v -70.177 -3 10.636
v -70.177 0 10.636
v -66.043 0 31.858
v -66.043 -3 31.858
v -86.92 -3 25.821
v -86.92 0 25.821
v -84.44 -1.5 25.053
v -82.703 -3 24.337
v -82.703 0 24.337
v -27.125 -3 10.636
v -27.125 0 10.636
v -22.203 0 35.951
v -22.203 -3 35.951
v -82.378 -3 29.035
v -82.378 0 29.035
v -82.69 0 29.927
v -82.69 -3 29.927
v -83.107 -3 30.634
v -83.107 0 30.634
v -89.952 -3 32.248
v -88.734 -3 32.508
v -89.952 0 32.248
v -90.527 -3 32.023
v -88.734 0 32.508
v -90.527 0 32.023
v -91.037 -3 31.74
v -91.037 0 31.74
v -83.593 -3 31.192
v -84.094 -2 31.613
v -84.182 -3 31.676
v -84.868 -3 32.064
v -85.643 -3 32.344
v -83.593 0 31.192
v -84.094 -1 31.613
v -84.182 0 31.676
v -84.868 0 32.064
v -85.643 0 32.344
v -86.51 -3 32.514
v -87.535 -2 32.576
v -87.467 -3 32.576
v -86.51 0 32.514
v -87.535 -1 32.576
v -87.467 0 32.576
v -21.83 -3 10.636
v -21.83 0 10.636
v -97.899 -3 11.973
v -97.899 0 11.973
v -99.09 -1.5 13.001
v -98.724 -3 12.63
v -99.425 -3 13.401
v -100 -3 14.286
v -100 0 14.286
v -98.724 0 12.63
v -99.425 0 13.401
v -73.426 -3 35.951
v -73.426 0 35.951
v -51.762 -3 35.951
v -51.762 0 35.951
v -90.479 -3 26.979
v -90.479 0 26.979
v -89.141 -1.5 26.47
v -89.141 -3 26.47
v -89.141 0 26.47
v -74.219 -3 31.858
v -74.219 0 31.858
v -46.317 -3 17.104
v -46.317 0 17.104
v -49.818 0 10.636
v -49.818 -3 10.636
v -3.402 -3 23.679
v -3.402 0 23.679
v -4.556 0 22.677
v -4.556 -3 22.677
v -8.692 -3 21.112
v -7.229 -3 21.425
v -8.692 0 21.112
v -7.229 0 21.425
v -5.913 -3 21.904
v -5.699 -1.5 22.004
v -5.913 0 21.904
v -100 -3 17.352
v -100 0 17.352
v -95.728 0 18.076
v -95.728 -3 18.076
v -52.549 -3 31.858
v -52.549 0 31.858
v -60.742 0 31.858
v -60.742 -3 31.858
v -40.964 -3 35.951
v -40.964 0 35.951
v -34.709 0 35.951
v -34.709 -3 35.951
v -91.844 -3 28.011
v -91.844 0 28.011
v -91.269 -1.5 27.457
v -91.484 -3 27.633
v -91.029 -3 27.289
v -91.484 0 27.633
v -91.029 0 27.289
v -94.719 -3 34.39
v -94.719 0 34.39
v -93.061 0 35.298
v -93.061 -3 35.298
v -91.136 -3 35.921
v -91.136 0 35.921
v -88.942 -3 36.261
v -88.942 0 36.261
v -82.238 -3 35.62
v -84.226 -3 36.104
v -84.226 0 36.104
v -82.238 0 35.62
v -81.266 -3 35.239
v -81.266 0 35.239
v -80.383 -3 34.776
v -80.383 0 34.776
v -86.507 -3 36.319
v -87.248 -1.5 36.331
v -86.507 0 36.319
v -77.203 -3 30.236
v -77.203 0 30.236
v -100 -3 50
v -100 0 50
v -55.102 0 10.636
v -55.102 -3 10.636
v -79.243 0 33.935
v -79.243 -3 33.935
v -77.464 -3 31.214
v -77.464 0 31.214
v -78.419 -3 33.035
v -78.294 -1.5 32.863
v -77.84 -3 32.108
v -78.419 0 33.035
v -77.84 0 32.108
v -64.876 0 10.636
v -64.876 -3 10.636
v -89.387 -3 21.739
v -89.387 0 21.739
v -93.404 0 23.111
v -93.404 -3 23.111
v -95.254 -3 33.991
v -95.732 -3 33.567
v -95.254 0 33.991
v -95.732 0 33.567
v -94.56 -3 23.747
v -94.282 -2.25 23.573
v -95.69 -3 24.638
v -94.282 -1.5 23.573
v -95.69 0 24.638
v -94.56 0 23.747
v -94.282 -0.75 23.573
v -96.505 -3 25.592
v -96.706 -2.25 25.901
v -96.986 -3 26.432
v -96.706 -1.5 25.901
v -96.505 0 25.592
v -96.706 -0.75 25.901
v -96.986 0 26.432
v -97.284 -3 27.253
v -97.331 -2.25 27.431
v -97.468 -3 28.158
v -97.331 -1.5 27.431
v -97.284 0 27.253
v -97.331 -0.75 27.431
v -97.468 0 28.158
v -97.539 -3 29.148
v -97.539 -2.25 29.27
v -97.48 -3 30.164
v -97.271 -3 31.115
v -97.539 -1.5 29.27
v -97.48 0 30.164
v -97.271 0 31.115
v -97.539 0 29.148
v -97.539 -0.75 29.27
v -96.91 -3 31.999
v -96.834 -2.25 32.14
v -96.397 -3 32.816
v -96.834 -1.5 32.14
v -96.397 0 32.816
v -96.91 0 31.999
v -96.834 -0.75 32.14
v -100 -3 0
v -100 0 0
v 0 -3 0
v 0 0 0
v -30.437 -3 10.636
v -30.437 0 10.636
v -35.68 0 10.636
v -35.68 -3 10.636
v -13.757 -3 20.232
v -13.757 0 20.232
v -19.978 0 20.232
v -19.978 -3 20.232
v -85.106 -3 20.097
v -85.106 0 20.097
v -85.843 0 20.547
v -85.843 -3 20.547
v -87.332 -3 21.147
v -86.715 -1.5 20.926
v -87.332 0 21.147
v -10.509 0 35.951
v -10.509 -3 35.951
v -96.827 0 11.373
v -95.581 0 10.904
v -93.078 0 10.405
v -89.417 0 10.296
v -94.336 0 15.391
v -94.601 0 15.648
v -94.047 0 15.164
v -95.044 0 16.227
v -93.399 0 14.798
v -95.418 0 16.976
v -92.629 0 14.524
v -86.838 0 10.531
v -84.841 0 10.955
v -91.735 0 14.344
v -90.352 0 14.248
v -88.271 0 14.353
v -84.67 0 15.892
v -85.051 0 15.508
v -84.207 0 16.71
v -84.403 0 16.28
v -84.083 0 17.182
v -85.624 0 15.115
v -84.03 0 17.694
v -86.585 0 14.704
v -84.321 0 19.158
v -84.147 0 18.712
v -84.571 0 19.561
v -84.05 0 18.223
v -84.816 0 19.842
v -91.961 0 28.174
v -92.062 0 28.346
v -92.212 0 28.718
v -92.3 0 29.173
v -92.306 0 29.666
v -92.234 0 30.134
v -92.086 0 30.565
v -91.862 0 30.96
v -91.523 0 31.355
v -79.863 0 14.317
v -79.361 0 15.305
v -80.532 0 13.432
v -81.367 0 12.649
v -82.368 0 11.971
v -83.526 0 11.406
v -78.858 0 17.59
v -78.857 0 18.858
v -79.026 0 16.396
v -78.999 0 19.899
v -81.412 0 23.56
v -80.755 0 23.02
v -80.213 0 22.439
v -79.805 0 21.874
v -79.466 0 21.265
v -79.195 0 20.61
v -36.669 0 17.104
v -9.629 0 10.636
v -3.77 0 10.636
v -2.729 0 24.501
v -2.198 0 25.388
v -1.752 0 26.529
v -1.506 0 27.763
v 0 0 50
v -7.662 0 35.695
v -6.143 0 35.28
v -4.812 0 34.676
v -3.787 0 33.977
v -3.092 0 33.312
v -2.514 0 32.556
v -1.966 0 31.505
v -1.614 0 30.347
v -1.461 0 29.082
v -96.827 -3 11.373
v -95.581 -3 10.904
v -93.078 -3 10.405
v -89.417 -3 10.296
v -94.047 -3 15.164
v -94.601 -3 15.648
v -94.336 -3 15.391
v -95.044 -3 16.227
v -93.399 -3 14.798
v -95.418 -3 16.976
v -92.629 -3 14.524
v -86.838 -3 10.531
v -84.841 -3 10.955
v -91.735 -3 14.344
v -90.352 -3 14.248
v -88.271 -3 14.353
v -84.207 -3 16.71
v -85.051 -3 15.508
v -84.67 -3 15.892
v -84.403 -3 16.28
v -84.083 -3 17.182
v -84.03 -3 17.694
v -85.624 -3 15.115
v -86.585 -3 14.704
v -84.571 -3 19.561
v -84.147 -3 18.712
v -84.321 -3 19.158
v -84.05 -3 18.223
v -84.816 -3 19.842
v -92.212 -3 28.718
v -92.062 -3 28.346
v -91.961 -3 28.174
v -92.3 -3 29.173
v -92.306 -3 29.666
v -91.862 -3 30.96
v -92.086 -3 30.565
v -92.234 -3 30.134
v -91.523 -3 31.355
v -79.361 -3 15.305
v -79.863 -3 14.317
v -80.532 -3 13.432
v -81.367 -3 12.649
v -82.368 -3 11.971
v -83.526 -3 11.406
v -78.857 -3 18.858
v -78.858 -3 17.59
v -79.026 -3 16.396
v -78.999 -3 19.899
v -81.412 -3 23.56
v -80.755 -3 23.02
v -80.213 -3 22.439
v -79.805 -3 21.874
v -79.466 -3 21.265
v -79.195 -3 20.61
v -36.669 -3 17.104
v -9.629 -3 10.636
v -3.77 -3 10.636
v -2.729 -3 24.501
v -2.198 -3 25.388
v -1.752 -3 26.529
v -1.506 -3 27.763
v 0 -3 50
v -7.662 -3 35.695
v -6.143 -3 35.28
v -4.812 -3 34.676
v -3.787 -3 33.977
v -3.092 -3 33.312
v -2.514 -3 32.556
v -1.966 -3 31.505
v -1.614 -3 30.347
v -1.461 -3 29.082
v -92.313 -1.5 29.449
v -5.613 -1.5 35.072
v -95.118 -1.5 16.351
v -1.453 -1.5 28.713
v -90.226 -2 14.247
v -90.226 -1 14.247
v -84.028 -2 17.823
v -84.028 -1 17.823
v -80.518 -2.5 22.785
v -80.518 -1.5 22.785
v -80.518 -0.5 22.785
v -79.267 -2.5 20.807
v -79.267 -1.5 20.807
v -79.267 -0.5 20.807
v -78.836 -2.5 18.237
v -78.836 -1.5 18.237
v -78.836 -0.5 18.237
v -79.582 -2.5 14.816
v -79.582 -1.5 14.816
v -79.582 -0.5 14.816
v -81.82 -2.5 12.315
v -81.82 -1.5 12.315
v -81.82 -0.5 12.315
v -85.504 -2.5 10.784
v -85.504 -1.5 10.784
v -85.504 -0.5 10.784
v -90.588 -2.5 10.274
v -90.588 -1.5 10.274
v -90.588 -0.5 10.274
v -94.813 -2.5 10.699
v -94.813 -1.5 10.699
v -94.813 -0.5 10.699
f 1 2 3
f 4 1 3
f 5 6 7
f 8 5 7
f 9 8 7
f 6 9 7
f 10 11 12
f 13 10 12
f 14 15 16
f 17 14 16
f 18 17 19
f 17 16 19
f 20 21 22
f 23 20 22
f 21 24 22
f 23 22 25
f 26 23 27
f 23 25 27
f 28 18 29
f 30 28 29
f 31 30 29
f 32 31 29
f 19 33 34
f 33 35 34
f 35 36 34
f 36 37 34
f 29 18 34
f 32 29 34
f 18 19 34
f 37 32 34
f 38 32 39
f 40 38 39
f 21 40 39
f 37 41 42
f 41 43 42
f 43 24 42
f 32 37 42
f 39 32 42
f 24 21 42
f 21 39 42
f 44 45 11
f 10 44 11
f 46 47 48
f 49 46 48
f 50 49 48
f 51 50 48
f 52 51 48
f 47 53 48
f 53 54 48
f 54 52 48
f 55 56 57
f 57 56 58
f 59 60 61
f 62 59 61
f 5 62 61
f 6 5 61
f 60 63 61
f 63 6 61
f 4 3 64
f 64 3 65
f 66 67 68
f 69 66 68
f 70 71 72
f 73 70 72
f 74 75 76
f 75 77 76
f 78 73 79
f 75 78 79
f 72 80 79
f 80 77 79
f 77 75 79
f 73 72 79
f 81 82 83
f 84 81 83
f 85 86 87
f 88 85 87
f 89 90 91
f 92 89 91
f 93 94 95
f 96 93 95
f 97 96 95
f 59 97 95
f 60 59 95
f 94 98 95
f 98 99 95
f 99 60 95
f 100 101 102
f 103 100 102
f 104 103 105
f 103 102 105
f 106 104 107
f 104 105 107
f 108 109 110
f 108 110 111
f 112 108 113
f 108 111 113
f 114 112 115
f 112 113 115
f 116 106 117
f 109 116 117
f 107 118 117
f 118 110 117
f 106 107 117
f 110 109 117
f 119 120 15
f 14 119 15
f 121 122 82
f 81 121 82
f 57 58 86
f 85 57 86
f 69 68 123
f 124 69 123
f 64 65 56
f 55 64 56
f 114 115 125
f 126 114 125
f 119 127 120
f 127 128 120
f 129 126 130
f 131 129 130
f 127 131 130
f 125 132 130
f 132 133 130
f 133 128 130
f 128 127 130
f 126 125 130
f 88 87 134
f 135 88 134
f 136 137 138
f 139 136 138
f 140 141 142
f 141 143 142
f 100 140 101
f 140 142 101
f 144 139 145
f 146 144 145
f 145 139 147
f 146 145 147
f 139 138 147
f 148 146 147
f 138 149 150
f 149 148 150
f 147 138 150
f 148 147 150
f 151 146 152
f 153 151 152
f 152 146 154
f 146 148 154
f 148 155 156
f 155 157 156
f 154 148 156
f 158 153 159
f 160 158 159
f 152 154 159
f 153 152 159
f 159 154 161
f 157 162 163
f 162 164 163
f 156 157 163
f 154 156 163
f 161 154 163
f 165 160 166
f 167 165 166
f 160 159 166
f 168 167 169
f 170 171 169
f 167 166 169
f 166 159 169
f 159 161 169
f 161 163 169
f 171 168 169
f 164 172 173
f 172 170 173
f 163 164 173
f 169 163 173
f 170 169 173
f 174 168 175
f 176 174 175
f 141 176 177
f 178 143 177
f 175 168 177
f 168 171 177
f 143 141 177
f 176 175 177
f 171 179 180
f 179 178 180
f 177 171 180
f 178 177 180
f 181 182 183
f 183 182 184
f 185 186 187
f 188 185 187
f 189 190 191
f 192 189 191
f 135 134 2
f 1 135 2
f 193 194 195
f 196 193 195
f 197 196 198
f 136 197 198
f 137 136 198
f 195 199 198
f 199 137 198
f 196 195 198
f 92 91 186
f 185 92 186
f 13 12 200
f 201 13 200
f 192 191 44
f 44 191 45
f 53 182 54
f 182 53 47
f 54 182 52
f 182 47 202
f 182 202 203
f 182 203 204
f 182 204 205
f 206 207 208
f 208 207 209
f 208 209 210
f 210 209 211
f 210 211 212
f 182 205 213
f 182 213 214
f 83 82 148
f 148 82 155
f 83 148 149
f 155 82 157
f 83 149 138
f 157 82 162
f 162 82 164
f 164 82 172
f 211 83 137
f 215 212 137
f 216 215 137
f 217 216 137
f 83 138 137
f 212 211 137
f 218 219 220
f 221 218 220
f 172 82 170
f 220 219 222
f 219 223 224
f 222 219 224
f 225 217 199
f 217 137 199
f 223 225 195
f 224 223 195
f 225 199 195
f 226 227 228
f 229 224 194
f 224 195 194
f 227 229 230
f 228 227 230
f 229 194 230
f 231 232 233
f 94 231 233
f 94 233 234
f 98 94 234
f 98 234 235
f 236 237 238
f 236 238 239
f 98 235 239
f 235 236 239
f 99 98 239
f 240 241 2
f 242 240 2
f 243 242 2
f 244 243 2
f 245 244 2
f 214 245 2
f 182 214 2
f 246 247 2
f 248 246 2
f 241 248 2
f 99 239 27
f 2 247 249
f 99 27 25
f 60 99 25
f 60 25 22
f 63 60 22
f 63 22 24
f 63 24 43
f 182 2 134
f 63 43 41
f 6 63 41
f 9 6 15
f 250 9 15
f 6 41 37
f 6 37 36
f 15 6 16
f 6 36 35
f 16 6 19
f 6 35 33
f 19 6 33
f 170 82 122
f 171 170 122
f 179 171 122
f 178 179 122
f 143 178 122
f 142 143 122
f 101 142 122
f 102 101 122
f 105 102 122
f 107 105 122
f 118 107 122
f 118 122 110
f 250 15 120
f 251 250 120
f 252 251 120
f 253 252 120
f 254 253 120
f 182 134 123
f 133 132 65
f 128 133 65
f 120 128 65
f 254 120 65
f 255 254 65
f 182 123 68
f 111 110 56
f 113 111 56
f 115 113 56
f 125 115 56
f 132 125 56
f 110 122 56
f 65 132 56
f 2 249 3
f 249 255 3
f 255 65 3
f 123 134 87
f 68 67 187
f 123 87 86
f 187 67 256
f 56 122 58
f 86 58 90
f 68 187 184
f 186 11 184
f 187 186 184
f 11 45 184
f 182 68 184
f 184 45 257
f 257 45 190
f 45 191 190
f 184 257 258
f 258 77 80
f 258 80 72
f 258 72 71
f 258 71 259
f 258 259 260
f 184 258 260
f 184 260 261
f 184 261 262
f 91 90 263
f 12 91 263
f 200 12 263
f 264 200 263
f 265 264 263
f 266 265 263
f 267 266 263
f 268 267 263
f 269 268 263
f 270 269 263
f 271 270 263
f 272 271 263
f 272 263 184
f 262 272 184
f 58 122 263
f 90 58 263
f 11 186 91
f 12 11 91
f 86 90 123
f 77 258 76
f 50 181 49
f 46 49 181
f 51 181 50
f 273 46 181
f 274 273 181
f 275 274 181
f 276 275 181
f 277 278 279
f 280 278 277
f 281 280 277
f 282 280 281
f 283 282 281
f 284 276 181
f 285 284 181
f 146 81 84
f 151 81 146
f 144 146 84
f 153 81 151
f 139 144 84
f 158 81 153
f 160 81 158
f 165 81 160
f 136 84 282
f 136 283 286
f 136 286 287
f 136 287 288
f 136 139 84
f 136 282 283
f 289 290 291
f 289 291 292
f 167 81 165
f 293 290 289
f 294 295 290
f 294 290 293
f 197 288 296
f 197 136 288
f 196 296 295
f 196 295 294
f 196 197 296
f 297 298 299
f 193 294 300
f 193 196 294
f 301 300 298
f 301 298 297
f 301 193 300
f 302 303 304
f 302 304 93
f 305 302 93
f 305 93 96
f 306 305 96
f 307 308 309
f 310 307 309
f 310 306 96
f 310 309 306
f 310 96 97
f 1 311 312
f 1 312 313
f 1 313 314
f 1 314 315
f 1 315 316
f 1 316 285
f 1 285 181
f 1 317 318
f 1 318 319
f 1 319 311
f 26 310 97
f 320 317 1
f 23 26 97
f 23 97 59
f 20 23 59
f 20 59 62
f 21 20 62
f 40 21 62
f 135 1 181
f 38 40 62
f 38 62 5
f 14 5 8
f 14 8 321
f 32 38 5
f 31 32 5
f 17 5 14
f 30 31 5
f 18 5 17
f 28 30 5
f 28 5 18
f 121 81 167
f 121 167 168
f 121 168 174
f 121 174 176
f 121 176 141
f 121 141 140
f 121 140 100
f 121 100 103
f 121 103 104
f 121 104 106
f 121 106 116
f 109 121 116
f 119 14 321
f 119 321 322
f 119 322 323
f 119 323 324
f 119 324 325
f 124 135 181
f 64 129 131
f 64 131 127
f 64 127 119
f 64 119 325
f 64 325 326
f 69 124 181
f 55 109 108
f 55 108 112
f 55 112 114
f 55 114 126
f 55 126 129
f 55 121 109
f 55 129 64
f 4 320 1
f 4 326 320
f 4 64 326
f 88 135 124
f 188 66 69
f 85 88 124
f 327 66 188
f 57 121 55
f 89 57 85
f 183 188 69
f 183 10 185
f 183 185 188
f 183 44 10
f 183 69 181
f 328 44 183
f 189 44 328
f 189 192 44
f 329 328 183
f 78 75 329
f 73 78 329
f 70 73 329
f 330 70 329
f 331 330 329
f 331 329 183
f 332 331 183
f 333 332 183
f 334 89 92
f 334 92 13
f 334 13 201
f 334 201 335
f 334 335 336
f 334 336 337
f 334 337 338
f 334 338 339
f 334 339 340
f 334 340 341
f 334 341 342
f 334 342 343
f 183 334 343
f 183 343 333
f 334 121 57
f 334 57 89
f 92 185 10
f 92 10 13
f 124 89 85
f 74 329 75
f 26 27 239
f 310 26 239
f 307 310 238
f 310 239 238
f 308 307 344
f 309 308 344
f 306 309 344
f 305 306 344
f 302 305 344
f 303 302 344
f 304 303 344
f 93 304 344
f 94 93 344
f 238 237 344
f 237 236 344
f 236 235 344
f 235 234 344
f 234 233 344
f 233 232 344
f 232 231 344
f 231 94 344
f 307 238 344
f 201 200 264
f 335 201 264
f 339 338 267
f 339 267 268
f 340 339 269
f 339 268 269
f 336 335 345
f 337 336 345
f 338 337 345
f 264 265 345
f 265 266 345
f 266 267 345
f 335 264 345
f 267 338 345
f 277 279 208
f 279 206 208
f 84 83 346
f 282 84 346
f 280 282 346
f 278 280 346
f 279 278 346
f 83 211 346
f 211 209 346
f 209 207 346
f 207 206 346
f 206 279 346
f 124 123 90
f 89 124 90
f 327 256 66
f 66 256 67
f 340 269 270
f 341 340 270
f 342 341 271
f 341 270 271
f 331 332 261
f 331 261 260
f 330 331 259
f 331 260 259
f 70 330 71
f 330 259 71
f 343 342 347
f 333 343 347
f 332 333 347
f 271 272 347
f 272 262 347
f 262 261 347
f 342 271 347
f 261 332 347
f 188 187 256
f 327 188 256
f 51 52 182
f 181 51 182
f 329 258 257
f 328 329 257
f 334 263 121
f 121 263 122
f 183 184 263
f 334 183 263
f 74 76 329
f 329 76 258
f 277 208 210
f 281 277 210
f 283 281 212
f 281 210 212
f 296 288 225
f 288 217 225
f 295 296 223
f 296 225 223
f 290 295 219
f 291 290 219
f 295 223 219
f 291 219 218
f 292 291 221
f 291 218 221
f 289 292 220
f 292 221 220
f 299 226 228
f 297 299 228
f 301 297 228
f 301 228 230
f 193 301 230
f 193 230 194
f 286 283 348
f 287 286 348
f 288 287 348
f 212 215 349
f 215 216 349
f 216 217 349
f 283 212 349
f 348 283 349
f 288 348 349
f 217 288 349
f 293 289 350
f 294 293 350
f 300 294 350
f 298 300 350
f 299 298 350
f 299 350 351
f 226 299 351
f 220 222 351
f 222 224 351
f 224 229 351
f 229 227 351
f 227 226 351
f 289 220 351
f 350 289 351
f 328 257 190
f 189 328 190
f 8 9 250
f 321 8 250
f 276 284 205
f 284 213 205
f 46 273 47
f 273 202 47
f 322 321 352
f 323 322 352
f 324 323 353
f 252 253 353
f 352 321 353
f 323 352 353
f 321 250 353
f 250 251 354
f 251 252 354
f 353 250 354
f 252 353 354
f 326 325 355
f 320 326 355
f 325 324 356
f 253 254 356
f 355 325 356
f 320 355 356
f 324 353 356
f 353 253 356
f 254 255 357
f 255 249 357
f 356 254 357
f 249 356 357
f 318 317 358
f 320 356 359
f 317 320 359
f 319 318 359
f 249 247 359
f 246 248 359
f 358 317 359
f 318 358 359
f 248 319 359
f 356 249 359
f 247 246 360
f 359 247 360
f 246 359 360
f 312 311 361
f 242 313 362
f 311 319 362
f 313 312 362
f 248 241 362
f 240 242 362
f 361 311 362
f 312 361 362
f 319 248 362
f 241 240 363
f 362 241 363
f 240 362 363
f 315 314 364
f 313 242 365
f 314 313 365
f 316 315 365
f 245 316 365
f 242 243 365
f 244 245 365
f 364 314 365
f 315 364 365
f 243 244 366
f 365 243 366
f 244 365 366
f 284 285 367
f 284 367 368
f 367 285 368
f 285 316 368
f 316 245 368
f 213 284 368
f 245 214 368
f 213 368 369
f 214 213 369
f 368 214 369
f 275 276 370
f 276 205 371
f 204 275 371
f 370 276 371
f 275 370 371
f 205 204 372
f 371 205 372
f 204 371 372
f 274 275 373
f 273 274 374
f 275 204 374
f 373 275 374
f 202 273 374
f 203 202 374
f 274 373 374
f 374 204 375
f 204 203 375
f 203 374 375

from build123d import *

# Parameters (mm, degrees)
F1_DEPTH = 3


with BuildPart() as f1:
    # F0 (on Front) → F1 (new body)
    with BuildSketch(Plane.XZ):
        with BuildLine():
            Line((-100, 0), (0, 0))
            Line((0, 0), (0, 50))
            Line((0, 50), (-100, 50))
            Line((-100, 50), (-100, 17.3523504695))
            Line((-100, 17.3523504695), (-95.7282808558, 18.0761301251))
            add(Edge.make_bspline(
                [(-95.7282808558, 18.0761301251), (-95.3488123547, 16.081045733), (-94.0465454532, 15.1639968553)],
                knots=[0, 0, 0, 1, 1, 1], degree=2))
            add(Edge.make_bspline(
                [(-94.0465454532, 15.1639968553), (-92.7442785517, 14.2469479777), (-90.2259875899, 14.2469479777)],
                knots=[0, 0, 0, 1, 1, 1], degree=2))
            add(Edge.make_bspline(
                [(-90.2259875899, 14.2469479777), (-84.0280020719, 14.2469479777), (-84.0280020719, 17.8231511244)],
                knots=[0, 0, 0, 1, 1, 1], degree=2))
            add(Edge.make_bspline(
                [(-84.0280020719, 17.8231511244), (-84.0280020719, 19.2605318104), (-85.1060375864, 20.0970873696)],
                knots=[0, 0, 0, 1, 1, 1], degree=2))
            add(Edge.make_bspline(
                [(-85.1060375864, 20.0970873696), (-86.1840731009, 20.9336429289), (-89.3865572693, 21.738576113)],
                knots=[0, 0, 0, 1, 1, 1], degree=2))
            add(Edge.make_bspline(
                [(-89.3865572693, 21.738576113), (-92.692532847, 22.6182530928), (-94.2822758857, 23.5726738683)],
                knots=[0, 0, 0, 1, 1, 1], degree=2))
            add(Edge.make_bspline(
                [(-94.2822758857, 23.5726738683), (-95.8720189244, 24.5270946438), (-96.7056997223, 25.9012305796)],
                knots=[0, 0, 0, 1, 1, 1], degree=2))
            add(Edge.make_bspline(
                [(-96.7056997223, 25.9012305796), (-97.5393805202, 27.2753665154), (-97.5393805202, 29.2704509076)],
                knots=[0, 0, 0, 1, 1, 1], degree=2))
            add(Edge.make_bspline(
                [(-97.5393805202, 29.2704509076), (-97.5393805202, 32.449936985), (-94.7192396143, 34.390400911)],
                knots=[0, 0, 0, 1, 1, 1], degree=2))
            add(Edge.make_bspline(
                [(-94.7192396143, 34.390400911), (-91.8990987084, 36.3308648371), (-87.2477348085, 36.3308648371)],
                knots=[0, 0, 0, 1, 1, 1], degree=2))
            add(Edge.make_bspline(
                [(-87.2477348085, 36.3308648371), (-82.9700898871, 36.3308648371), (-80.3828046523, 34.7756189349)],
                knots=[0, 0, 0, 1, 1, 1], degree=2))
            add(Edge.make_bspline(
                [(-80.3828046523, 34.7756189349), (-77.7955194175, 33.2203730326), (-77.2033185749, 30.2363707285)],
                knots=[0, 0, 0, 1, 1, 1], degree=2))
            Line((-77.2033185749, 30.2363707285), (-82.3778890444, 29.0347204751))
            add(Edge.make_bspline(
                [(-82.3778890444, 29.0347204751), (-82.7746061138, 30.6503363661), (-84.0941215835, 31.6133814257)],
                knots=[0, 0, 0, 1, 1, 1], degree=2))
            add(Edge.make_bspline(
                [(-84.0941215835, 31.6133814257), (-85.4136370532, 32.5764264853), (-87.5352109457, 32.5764264853)],
                knots=[0, 0, 0, 1, 1, 1], degree=2))
            add(Edge.make_bspline(
                [(-87.5352109457, 32.5764264853), (-89.7602762476, 32.5764264853), (-91.0366702968, 31.7398709261)],
                knots=[0, 0, 0, 1, 1, 1], degree=2))
            add(Edge.make_bspline(
                [(-91.0366702968, 31.7398709261), (-92.3130643459, 30.9033153668), (-92.3130643459, 29.4486861126)],
                knots=[0, 0, 0, 1, 1, 1], degree=2))
            add(Edge.make_bspline(
                [(-92.3130643459, 29.4486861126), (-92.3130643459, 28.6035062693), (-91.8444782423, 28.0113054266)],
                knots=[0, 0, 0, 1, 1, 1], degree=2))
            add(Edge.make_bspline(
                [(-91.8444782423, 28.0113054266), (-91.3758921387, 27.419104584), (-90.4789665906, 26.9792660941)],
                knots=[0, 0, 0, 1, 1, 1], degree=2))
            add(Edge.make_bspline(
                [(-90.4789665906, 26.9792660941), (-89.5820410426, 26.5394276042), (-86.9200120121, 25.8207372612)],
                knots=[0, 0, 0, 1, 1, 1], degree=2))
            add(Edge.make_bspline(
                [(-86.9200120121, 25.8207372612), (-84.0682487312, 25.0273031225), (-82.7027370795, 24.3373603933)],
                knots=[0, 0, 0, 1, 1, 1], degree=2))
            add(Edge.make_bspline(
                [(-82.7027370795, 24.3373603933), (-81.3372254278, 23.647417664), (-80.5179184368, 22.7849892524)],
                knots=[0, 0, 0, 1, 1, 1], degree=2))
            add(Edge.make_bspline(
                [(-80.5179184368, 22.7849892524), (-79.6986114458, 21.9225608408), (-79.26739724, 20.8071534285)],
                knots=[0, 0, 0, 1, 1, 1], degree=2))
            add(Edge.make_bspline(
                [(-79.26739724, 20.8071534285), (-78.8361830342, 19.6917460162), (-78.8361830342, 18.237116762)],
                knots=[0, 0, 0, 1, 1, 1], degree=2))
            add(Edge.make_bspline(
                [(-78.8361830342, 18.237116762), (-78.8361830342, 14.3561889098), (-81.8201853383, 12.3151083357)],
                knots=[0, 0, 0, 1, 1, 1], degree=2))
            add(Edge.make_bspline(
                [(-81.8201853383, 12.3151083357), (-84.8041876424, 10.2740277616), (-90.5882075228, 10.2740277616)],
                knots=[0, 0, 0, 1, 1, 1], degree=2))
            add(Edge.make_bspline(
                [(-90.5882075228, 10.2740277616), (-95.3833094912, 10.2740277616), (-97.8987256917, 11.9730117325)],
                knots=[0, 0, 0, 1, 1, 1], degree=2))
            add(Edge.make_bspline(
                [(-97.8987256917, 11.9730117325), (-99.2313673487, 12.8731159831), (-100, 14.2855889299)],
                knots=[0, 0, 0, 0.529789725, 0.529789725, 0.529789725], degree=2))
            Line((-100, 14.2855889299), (-100, 0))
        make_face()
        Polygon((-52.5493650489, 31.8577361423), (-60.742434959, 31.8577361423), (-64.8763418119, 10.6362476945), (-70.1774017818, 10.6362476945), (-66.0434949289, 31.8577361423), (-74.2193162708, 31.8577361423), (-73.4258821321, 35.951396336), (-51.761680433, 35.951396336), align=None, mode=Mode.SUBTRACT)
        Polygon((-30.4367005758, 10.6362476945), (-35.6802653183, 10.6362476945), (-36.6691832302, 17.1044607814), (-46.3168823945, 17.1044607814), (-49.8183417456, 10.6362476945), (-55.1021531472, 10.6362476945), (-40.9640767199, 35.951396336), (-34.7085959745, 35.951396336), align=None, mode=Mode.SUBTRACT)
        with BuildLine():
            Line((-3.7704140895, 10.6362476945), (-9.6291777655, 10.6362476945))
            Line((-9.6291777655, 10.6362476945), (-13.7573350957, 20.2322011541))
            Line((-13.7573350957, 20.2322011541), (-19.9783187046, 20.2322011541))
            Line((-19.9783187046, 20.2322011541), (-21.8296650281, 10.6362476945))
            Line((-21.8296650281, 10.6362476945), (-27.1249754753, 10.6362476945))
            Line((-27.1249754753, 10.6362476945), (-22.2033840065, 35.951396336))
            Line((-22.2033840065, 35.951396336), (-10.5088547453, 35.951396336))
            add(Edge.make_bspline(
                [(-10.5088547453, 35.951396336), (-7.6513419416, 35.951396336), (-5.6131361289, 35.0717193562)],
                knots=[0, 0, 0, 1, 1, 1], degree=2))
            add(Edge.make_bspline(
                [(-5.6131361289, 35.0717193562), (-3.5749303162, 34.1920423764), (-2.5141433699, 32.5563031557)],
                knots=[0, 0, 0, 1, 1, 1], degree=2))
            add(Edge.make_bspline(
                [(-2.5141433699, 32.5563031557), (-1.4533564237, 30.9205639351), (-1.4533564237, 28.7127472014)],
                knots=[0, 0, 0, 1, 1, 1], degree=2))
            add(Edge.make_bspline(
                [(-1.4533564237, 28.7127472014), (-1.4533564237, 25.7459934655), (-3.4024446338, 23.6790400391)],
                knots=[0, 0, 0, 1, 1, 1], degree=2))
            add(Edge.make_bspline(
                [(-3.4024446338, 23.6790400391), (-5.351532844, 21.6120866127), (-8.6920055583, 21.1118781339)],
                knots=[0, 0, 0, 1, 1, 1], degree=2))
            Line((-8.6920055583, 21.1118781339), (-3.7704140895, 10.6362476945))
        make_face(mode=Mode.SUBTRACT)
    extrude(amount=F1_DEPTH)


solid = f1.part
